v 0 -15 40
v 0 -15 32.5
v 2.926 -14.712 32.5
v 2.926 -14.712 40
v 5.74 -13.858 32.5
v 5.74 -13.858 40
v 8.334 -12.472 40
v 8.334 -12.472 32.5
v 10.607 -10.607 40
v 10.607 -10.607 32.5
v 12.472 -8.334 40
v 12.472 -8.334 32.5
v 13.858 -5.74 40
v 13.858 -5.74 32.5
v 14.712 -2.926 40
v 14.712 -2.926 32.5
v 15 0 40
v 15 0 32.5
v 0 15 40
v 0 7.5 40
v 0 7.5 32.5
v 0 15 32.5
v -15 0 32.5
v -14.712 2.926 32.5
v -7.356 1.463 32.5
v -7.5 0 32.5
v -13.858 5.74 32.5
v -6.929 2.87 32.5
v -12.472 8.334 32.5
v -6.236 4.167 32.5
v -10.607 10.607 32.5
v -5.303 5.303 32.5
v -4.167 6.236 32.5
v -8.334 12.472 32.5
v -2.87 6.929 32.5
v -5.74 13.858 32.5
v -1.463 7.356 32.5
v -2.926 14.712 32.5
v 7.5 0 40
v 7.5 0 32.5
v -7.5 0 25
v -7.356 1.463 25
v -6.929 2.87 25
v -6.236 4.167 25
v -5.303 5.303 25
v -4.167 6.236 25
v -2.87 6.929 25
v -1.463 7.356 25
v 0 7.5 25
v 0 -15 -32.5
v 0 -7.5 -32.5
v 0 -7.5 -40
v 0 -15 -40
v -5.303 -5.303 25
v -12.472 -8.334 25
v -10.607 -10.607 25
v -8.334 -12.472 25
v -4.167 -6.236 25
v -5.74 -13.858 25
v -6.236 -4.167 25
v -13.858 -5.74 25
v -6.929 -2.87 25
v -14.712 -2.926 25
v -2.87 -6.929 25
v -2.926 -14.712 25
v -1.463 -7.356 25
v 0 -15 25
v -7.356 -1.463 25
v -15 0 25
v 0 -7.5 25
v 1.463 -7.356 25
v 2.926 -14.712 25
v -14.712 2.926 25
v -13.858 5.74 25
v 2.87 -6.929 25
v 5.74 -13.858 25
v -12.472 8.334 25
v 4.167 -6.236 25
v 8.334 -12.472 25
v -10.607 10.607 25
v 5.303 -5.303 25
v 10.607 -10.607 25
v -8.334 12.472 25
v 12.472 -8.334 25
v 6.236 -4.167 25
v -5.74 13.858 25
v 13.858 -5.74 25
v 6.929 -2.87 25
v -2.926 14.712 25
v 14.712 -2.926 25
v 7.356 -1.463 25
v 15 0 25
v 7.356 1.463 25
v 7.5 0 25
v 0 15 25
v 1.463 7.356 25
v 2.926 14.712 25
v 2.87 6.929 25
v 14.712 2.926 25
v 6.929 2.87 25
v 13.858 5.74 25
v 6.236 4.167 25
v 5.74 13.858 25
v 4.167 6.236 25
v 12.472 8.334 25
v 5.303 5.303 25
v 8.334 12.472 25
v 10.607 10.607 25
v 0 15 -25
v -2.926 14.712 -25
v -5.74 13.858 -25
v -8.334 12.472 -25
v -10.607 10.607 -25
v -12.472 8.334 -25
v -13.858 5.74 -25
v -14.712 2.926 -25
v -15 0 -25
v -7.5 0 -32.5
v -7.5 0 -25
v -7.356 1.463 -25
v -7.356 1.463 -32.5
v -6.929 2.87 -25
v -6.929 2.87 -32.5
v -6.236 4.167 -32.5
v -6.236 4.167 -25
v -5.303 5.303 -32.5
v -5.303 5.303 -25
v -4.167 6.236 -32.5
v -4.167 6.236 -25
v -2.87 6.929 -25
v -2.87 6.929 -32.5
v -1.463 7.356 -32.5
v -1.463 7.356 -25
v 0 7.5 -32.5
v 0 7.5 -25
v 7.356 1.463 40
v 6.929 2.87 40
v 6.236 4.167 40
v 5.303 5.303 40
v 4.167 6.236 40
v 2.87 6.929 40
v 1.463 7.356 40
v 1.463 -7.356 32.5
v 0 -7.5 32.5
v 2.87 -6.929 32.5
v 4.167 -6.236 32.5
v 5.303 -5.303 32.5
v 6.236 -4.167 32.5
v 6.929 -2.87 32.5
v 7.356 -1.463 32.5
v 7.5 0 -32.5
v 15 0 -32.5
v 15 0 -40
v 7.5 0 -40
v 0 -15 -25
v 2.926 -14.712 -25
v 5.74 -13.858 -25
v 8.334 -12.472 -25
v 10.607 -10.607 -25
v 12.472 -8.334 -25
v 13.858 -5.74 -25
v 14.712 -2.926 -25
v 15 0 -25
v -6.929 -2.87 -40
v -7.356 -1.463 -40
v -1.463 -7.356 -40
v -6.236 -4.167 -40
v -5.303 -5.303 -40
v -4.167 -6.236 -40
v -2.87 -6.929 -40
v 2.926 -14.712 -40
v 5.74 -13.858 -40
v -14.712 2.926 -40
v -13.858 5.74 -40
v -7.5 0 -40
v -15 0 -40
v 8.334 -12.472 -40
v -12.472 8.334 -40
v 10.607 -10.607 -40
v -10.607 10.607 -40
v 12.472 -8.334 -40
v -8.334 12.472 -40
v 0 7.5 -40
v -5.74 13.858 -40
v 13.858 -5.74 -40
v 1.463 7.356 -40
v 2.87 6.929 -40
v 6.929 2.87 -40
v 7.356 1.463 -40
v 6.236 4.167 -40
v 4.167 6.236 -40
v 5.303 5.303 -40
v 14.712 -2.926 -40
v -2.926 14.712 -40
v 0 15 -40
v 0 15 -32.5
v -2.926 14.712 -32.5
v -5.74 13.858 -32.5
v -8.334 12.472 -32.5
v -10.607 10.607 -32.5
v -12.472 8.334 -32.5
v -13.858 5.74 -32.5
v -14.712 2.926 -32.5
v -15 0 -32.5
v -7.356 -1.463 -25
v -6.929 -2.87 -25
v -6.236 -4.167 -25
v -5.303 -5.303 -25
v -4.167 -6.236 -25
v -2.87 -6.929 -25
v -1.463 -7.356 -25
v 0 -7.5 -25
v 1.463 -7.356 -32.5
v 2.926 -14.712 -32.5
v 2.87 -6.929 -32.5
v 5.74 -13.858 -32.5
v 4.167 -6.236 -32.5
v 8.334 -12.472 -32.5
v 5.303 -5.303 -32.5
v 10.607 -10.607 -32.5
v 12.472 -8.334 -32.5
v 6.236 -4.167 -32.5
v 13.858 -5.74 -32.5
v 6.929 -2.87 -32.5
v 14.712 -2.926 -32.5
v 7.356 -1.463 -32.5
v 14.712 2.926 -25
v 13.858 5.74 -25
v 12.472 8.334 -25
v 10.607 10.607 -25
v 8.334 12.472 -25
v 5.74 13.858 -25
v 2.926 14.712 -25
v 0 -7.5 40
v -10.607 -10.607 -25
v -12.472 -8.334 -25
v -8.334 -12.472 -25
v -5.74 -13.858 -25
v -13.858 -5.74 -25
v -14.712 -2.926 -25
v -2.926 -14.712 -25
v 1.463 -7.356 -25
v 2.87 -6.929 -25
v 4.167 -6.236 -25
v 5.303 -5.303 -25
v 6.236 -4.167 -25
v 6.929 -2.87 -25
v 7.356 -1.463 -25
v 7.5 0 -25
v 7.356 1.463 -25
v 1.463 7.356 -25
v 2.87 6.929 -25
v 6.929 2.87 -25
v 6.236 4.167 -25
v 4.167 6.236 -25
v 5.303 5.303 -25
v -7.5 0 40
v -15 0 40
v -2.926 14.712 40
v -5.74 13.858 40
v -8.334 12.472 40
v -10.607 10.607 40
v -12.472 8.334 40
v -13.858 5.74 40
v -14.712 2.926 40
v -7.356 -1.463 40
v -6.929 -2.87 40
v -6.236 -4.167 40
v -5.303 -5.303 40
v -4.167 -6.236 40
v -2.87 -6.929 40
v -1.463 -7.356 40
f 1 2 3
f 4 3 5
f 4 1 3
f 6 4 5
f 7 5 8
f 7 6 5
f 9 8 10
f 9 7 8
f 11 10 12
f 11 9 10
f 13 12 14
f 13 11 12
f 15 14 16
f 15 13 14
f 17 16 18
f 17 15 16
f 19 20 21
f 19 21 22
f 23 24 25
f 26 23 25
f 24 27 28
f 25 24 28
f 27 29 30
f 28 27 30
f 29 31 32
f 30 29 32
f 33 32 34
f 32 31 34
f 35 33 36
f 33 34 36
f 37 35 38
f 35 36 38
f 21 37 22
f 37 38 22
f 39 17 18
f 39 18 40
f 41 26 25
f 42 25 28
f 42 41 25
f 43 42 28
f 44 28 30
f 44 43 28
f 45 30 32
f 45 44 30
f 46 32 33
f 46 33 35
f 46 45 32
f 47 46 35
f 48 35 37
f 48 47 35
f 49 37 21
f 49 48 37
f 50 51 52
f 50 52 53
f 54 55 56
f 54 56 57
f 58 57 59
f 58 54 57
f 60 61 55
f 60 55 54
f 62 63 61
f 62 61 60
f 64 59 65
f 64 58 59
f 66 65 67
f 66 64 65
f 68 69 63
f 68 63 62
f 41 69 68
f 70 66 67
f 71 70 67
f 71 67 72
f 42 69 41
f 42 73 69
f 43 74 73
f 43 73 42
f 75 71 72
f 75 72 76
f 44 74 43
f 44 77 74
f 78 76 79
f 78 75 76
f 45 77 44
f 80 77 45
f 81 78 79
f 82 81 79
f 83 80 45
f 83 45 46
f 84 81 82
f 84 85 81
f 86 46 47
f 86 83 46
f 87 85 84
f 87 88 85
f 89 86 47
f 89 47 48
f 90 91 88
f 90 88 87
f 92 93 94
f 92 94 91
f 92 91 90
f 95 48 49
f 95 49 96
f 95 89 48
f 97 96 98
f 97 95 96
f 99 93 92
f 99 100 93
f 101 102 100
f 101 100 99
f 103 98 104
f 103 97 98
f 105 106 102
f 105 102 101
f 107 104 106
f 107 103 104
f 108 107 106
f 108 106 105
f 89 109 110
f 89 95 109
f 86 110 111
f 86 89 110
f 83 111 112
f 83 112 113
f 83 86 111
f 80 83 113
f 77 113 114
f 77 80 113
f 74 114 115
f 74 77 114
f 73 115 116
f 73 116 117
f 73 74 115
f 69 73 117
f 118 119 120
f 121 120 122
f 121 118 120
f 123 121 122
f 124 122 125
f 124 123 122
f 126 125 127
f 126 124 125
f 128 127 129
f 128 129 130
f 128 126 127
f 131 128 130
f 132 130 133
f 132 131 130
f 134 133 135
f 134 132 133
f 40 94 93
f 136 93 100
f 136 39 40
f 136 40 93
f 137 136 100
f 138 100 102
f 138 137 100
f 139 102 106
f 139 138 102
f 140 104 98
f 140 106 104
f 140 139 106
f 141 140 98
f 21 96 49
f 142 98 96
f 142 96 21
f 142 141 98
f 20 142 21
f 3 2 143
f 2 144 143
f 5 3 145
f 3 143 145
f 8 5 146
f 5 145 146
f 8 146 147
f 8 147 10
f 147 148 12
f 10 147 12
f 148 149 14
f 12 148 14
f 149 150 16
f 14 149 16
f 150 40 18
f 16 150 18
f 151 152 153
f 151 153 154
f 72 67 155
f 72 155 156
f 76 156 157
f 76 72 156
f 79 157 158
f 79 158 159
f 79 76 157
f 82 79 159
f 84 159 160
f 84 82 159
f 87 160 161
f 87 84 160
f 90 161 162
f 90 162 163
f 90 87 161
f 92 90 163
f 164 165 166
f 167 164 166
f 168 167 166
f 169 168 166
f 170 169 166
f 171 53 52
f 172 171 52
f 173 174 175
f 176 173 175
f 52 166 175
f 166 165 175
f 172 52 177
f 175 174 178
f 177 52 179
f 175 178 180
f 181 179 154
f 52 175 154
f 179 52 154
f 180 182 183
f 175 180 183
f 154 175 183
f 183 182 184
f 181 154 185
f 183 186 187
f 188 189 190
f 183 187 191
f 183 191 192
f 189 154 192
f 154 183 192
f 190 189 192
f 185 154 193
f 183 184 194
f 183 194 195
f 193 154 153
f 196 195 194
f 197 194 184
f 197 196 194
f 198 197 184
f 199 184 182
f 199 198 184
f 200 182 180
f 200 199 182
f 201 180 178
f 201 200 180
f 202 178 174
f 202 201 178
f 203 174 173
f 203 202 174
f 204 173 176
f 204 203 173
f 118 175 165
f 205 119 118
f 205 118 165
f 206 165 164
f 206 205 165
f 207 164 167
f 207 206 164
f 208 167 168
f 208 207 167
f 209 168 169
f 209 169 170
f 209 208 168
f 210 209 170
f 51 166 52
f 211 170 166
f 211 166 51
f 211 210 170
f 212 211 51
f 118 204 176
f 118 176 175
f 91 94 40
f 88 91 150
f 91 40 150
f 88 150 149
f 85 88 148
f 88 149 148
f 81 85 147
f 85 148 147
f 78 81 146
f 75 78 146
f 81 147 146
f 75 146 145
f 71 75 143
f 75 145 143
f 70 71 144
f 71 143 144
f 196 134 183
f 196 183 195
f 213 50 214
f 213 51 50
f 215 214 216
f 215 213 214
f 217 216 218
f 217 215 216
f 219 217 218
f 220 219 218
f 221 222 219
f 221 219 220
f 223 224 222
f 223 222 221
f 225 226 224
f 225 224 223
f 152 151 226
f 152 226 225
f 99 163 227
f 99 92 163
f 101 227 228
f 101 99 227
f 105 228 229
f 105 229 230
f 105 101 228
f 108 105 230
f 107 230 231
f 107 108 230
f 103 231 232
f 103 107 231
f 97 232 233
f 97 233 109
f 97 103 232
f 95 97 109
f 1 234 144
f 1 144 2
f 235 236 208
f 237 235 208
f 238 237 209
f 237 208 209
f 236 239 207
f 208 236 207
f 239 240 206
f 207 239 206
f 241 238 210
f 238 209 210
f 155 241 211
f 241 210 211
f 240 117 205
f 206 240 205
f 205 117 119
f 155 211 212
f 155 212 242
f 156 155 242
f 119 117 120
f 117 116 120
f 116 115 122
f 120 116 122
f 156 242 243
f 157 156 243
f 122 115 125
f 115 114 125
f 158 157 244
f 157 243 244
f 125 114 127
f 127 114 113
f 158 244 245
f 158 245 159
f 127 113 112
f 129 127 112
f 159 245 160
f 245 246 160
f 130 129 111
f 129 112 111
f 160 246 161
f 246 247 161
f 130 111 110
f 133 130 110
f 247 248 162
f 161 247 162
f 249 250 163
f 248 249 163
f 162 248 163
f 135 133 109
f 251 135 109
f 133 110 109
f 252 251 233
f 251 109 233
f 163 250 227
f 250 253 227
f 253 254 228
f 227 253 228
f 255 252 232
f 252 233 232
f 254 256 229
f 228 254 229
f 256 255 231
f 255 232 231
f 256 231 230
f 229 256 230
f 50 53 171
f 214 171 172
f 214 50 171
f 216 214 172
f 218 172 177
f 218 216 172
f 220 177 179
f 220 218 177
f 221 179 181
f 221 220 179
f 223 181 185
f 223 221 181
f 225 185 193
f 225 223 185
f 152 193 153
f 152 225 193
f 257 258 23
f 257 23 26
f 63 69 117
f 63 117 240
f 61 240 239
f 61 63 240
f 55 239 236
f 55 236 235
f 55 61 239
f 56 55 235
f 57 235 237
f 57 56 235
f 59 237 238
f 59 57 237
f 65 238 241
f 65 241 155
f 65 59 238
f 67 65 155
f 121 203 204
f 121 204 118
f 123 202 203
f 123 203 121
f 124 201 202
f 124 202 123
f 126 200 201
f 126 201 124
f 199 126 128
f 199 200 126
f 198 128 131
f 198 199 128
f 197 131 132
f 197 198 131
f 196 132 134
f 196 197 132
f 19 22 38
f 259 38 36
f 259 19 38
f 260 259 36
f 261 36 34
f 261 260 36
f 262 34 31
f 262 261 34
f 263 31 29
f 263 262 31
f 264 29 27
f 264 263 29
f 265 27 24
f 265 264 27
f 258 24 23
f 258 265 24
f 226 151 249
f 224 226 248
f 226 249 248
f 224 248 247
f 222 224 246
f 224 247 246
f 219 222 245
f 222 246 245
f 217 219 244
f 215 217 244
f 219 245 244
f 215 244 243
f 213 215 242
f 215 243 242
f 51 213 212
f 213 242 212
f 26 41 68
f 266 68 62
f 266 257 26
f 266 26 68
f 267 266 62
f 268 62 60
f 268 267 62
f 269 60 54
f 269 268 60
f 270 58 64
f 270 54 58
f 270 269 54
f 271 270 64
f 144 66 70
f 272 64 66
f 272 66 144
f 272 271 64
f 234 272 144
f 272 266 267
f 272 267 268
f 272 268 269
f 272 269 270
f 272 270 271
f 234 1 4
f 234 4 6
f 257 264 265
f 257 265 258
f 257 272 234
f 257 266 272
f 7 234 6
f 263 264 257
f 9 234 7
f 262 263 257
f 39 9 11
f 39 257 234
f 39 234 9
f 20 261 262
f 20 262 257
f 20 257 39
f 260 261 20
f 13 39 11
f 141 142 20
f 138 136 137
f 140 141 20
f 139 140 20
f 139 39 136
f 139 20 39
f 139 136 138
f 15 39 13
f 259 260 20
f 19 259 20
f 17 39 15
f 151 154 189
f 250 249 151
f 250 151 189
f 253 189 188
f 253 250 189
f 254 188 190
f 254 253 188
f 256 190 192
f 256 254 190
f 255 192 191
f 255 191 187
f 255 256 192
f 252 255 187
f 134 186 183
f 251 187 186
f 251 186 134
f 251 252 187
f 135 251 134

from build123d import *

# Parameters (mm, degrees)
F1_DEPTH = 40
F2_DEPTH = 32.5
F3_DEPTH = 25


with BuildPart() as f1:
    # F0 (on Top) → F1 (new body, symmetric)
    with BuildSketch(Plane.XY):
        with BuildLine():
            Line((0, 7.5), (0, 15))
            ThreePointArc((0, 15), (-10.606602, 10.606602), (-15, 0))
            Line((-15, 0), (-7.5, 0))
            ThreePointArc((-7.5, 0), (-5.303301, 5.303301), (0, 7.5))
        make_face()
        with BuildLine():
            ThreePointArc((0, -15), (10.606602, -10.606602), (15, 0))
            Line((15, 0), (7.5, 0))
            ThreePointArc((7.5, 0), (5.303301, -5.303301), (0, -7.5))
            Line((0, -7.5), (0, -15))
        make_face()
        with BuildLine():
            ThreePointArc((0, -7.5), (5.303301, -5.303301), (7.5, 0))
            ThreePointArc((7.5, 0), (5.303301, 5.303301), (0, 7.5))
            ThreePointArc((0, 7.5), (-5.303301, 5.303301), (-7.5, 0))
            ThreePointArc((-7.5, 0), (-5.303301, -5.303301), (0, -7.5))
        make_face()
    extrude(amount=F1_DEPTH, both=True)

    # F0 (on Top) → F2 (cut, symmetric)
    with BuildSketch(Plane.XY):
        with BuildLine():
            Line((0, 7.5), (0, 15))
            ThreePointArc((0, 15), (-10.606602, 10.606602), (-15, 0))
            Line((-15, 0), (-7.5, 0))
            ThreePointArc((-7.5, 0), (-5.303301, 5.303301), (0, 7.5))
        make_face()
        with BuildLine():
            ThreePointArc((0, -15), (10.606602, -10.606602), (15, 0))
            Line((15, 0), (7.5, 0))
            ThreePointArc((7.5, 0), (5.303301, -5.303301), (0, -7.5))
            Line((0, -7.5), (0, -15))
        make_face()
    extrude(amount=F2_DEPTH, both=True, mode=Mode.SUBTRACT)

    # F0 (on Top) → F3 (join, symmetric)
    with BuildSketch(Plane.XY):
        with BuildLine():
            Line((0, 7.5), (0, 15))
            ThreePointArc((0, 15), (-10.606602, 10.606602), (-15, 0))
            Line((-15, 0), (-7.5, 0))
            ThreePointArc((-7.5, 0), (-5.303301, 5.303301), (0, 7.5))
        make_face()
        with BuildLine():
            ThreePointArc((-15, 0), (-10.606602, -10.606602), (0, -15))
            Line((0, -15), (0, -7.5))
            ThreePointArc((0, -7.5), (-5.303301, -5.303301), (-7.5, 0))
            Line((-7.5, 0), (-15, 0))
        make_face()
        with BuildLine():
            Line((7.5, 0), (15, 0))
            ThreePointArc((15, 0), (10.606602, 10.606602), (0, 15))
            Line((0, 15), (0, 7.5))
            ThreePointArc((0, 7.5), (5.303301, 5.303301), (7.5, 0))
        make_face()
        with BuildLine():
            ThreePointArc((0, -15), (10.606602, -10.606602), (15, 0))
            Line((15, 0), (7.5, 0))
            ThreePointArc((7.5, 0), (5.303301, -5.303301), (0, -7.5))
            Line((0, -7.5), (0, -15))
        make_face()
    extrude(amount=F3_DEPTH, both=True)


solid = f1.part
